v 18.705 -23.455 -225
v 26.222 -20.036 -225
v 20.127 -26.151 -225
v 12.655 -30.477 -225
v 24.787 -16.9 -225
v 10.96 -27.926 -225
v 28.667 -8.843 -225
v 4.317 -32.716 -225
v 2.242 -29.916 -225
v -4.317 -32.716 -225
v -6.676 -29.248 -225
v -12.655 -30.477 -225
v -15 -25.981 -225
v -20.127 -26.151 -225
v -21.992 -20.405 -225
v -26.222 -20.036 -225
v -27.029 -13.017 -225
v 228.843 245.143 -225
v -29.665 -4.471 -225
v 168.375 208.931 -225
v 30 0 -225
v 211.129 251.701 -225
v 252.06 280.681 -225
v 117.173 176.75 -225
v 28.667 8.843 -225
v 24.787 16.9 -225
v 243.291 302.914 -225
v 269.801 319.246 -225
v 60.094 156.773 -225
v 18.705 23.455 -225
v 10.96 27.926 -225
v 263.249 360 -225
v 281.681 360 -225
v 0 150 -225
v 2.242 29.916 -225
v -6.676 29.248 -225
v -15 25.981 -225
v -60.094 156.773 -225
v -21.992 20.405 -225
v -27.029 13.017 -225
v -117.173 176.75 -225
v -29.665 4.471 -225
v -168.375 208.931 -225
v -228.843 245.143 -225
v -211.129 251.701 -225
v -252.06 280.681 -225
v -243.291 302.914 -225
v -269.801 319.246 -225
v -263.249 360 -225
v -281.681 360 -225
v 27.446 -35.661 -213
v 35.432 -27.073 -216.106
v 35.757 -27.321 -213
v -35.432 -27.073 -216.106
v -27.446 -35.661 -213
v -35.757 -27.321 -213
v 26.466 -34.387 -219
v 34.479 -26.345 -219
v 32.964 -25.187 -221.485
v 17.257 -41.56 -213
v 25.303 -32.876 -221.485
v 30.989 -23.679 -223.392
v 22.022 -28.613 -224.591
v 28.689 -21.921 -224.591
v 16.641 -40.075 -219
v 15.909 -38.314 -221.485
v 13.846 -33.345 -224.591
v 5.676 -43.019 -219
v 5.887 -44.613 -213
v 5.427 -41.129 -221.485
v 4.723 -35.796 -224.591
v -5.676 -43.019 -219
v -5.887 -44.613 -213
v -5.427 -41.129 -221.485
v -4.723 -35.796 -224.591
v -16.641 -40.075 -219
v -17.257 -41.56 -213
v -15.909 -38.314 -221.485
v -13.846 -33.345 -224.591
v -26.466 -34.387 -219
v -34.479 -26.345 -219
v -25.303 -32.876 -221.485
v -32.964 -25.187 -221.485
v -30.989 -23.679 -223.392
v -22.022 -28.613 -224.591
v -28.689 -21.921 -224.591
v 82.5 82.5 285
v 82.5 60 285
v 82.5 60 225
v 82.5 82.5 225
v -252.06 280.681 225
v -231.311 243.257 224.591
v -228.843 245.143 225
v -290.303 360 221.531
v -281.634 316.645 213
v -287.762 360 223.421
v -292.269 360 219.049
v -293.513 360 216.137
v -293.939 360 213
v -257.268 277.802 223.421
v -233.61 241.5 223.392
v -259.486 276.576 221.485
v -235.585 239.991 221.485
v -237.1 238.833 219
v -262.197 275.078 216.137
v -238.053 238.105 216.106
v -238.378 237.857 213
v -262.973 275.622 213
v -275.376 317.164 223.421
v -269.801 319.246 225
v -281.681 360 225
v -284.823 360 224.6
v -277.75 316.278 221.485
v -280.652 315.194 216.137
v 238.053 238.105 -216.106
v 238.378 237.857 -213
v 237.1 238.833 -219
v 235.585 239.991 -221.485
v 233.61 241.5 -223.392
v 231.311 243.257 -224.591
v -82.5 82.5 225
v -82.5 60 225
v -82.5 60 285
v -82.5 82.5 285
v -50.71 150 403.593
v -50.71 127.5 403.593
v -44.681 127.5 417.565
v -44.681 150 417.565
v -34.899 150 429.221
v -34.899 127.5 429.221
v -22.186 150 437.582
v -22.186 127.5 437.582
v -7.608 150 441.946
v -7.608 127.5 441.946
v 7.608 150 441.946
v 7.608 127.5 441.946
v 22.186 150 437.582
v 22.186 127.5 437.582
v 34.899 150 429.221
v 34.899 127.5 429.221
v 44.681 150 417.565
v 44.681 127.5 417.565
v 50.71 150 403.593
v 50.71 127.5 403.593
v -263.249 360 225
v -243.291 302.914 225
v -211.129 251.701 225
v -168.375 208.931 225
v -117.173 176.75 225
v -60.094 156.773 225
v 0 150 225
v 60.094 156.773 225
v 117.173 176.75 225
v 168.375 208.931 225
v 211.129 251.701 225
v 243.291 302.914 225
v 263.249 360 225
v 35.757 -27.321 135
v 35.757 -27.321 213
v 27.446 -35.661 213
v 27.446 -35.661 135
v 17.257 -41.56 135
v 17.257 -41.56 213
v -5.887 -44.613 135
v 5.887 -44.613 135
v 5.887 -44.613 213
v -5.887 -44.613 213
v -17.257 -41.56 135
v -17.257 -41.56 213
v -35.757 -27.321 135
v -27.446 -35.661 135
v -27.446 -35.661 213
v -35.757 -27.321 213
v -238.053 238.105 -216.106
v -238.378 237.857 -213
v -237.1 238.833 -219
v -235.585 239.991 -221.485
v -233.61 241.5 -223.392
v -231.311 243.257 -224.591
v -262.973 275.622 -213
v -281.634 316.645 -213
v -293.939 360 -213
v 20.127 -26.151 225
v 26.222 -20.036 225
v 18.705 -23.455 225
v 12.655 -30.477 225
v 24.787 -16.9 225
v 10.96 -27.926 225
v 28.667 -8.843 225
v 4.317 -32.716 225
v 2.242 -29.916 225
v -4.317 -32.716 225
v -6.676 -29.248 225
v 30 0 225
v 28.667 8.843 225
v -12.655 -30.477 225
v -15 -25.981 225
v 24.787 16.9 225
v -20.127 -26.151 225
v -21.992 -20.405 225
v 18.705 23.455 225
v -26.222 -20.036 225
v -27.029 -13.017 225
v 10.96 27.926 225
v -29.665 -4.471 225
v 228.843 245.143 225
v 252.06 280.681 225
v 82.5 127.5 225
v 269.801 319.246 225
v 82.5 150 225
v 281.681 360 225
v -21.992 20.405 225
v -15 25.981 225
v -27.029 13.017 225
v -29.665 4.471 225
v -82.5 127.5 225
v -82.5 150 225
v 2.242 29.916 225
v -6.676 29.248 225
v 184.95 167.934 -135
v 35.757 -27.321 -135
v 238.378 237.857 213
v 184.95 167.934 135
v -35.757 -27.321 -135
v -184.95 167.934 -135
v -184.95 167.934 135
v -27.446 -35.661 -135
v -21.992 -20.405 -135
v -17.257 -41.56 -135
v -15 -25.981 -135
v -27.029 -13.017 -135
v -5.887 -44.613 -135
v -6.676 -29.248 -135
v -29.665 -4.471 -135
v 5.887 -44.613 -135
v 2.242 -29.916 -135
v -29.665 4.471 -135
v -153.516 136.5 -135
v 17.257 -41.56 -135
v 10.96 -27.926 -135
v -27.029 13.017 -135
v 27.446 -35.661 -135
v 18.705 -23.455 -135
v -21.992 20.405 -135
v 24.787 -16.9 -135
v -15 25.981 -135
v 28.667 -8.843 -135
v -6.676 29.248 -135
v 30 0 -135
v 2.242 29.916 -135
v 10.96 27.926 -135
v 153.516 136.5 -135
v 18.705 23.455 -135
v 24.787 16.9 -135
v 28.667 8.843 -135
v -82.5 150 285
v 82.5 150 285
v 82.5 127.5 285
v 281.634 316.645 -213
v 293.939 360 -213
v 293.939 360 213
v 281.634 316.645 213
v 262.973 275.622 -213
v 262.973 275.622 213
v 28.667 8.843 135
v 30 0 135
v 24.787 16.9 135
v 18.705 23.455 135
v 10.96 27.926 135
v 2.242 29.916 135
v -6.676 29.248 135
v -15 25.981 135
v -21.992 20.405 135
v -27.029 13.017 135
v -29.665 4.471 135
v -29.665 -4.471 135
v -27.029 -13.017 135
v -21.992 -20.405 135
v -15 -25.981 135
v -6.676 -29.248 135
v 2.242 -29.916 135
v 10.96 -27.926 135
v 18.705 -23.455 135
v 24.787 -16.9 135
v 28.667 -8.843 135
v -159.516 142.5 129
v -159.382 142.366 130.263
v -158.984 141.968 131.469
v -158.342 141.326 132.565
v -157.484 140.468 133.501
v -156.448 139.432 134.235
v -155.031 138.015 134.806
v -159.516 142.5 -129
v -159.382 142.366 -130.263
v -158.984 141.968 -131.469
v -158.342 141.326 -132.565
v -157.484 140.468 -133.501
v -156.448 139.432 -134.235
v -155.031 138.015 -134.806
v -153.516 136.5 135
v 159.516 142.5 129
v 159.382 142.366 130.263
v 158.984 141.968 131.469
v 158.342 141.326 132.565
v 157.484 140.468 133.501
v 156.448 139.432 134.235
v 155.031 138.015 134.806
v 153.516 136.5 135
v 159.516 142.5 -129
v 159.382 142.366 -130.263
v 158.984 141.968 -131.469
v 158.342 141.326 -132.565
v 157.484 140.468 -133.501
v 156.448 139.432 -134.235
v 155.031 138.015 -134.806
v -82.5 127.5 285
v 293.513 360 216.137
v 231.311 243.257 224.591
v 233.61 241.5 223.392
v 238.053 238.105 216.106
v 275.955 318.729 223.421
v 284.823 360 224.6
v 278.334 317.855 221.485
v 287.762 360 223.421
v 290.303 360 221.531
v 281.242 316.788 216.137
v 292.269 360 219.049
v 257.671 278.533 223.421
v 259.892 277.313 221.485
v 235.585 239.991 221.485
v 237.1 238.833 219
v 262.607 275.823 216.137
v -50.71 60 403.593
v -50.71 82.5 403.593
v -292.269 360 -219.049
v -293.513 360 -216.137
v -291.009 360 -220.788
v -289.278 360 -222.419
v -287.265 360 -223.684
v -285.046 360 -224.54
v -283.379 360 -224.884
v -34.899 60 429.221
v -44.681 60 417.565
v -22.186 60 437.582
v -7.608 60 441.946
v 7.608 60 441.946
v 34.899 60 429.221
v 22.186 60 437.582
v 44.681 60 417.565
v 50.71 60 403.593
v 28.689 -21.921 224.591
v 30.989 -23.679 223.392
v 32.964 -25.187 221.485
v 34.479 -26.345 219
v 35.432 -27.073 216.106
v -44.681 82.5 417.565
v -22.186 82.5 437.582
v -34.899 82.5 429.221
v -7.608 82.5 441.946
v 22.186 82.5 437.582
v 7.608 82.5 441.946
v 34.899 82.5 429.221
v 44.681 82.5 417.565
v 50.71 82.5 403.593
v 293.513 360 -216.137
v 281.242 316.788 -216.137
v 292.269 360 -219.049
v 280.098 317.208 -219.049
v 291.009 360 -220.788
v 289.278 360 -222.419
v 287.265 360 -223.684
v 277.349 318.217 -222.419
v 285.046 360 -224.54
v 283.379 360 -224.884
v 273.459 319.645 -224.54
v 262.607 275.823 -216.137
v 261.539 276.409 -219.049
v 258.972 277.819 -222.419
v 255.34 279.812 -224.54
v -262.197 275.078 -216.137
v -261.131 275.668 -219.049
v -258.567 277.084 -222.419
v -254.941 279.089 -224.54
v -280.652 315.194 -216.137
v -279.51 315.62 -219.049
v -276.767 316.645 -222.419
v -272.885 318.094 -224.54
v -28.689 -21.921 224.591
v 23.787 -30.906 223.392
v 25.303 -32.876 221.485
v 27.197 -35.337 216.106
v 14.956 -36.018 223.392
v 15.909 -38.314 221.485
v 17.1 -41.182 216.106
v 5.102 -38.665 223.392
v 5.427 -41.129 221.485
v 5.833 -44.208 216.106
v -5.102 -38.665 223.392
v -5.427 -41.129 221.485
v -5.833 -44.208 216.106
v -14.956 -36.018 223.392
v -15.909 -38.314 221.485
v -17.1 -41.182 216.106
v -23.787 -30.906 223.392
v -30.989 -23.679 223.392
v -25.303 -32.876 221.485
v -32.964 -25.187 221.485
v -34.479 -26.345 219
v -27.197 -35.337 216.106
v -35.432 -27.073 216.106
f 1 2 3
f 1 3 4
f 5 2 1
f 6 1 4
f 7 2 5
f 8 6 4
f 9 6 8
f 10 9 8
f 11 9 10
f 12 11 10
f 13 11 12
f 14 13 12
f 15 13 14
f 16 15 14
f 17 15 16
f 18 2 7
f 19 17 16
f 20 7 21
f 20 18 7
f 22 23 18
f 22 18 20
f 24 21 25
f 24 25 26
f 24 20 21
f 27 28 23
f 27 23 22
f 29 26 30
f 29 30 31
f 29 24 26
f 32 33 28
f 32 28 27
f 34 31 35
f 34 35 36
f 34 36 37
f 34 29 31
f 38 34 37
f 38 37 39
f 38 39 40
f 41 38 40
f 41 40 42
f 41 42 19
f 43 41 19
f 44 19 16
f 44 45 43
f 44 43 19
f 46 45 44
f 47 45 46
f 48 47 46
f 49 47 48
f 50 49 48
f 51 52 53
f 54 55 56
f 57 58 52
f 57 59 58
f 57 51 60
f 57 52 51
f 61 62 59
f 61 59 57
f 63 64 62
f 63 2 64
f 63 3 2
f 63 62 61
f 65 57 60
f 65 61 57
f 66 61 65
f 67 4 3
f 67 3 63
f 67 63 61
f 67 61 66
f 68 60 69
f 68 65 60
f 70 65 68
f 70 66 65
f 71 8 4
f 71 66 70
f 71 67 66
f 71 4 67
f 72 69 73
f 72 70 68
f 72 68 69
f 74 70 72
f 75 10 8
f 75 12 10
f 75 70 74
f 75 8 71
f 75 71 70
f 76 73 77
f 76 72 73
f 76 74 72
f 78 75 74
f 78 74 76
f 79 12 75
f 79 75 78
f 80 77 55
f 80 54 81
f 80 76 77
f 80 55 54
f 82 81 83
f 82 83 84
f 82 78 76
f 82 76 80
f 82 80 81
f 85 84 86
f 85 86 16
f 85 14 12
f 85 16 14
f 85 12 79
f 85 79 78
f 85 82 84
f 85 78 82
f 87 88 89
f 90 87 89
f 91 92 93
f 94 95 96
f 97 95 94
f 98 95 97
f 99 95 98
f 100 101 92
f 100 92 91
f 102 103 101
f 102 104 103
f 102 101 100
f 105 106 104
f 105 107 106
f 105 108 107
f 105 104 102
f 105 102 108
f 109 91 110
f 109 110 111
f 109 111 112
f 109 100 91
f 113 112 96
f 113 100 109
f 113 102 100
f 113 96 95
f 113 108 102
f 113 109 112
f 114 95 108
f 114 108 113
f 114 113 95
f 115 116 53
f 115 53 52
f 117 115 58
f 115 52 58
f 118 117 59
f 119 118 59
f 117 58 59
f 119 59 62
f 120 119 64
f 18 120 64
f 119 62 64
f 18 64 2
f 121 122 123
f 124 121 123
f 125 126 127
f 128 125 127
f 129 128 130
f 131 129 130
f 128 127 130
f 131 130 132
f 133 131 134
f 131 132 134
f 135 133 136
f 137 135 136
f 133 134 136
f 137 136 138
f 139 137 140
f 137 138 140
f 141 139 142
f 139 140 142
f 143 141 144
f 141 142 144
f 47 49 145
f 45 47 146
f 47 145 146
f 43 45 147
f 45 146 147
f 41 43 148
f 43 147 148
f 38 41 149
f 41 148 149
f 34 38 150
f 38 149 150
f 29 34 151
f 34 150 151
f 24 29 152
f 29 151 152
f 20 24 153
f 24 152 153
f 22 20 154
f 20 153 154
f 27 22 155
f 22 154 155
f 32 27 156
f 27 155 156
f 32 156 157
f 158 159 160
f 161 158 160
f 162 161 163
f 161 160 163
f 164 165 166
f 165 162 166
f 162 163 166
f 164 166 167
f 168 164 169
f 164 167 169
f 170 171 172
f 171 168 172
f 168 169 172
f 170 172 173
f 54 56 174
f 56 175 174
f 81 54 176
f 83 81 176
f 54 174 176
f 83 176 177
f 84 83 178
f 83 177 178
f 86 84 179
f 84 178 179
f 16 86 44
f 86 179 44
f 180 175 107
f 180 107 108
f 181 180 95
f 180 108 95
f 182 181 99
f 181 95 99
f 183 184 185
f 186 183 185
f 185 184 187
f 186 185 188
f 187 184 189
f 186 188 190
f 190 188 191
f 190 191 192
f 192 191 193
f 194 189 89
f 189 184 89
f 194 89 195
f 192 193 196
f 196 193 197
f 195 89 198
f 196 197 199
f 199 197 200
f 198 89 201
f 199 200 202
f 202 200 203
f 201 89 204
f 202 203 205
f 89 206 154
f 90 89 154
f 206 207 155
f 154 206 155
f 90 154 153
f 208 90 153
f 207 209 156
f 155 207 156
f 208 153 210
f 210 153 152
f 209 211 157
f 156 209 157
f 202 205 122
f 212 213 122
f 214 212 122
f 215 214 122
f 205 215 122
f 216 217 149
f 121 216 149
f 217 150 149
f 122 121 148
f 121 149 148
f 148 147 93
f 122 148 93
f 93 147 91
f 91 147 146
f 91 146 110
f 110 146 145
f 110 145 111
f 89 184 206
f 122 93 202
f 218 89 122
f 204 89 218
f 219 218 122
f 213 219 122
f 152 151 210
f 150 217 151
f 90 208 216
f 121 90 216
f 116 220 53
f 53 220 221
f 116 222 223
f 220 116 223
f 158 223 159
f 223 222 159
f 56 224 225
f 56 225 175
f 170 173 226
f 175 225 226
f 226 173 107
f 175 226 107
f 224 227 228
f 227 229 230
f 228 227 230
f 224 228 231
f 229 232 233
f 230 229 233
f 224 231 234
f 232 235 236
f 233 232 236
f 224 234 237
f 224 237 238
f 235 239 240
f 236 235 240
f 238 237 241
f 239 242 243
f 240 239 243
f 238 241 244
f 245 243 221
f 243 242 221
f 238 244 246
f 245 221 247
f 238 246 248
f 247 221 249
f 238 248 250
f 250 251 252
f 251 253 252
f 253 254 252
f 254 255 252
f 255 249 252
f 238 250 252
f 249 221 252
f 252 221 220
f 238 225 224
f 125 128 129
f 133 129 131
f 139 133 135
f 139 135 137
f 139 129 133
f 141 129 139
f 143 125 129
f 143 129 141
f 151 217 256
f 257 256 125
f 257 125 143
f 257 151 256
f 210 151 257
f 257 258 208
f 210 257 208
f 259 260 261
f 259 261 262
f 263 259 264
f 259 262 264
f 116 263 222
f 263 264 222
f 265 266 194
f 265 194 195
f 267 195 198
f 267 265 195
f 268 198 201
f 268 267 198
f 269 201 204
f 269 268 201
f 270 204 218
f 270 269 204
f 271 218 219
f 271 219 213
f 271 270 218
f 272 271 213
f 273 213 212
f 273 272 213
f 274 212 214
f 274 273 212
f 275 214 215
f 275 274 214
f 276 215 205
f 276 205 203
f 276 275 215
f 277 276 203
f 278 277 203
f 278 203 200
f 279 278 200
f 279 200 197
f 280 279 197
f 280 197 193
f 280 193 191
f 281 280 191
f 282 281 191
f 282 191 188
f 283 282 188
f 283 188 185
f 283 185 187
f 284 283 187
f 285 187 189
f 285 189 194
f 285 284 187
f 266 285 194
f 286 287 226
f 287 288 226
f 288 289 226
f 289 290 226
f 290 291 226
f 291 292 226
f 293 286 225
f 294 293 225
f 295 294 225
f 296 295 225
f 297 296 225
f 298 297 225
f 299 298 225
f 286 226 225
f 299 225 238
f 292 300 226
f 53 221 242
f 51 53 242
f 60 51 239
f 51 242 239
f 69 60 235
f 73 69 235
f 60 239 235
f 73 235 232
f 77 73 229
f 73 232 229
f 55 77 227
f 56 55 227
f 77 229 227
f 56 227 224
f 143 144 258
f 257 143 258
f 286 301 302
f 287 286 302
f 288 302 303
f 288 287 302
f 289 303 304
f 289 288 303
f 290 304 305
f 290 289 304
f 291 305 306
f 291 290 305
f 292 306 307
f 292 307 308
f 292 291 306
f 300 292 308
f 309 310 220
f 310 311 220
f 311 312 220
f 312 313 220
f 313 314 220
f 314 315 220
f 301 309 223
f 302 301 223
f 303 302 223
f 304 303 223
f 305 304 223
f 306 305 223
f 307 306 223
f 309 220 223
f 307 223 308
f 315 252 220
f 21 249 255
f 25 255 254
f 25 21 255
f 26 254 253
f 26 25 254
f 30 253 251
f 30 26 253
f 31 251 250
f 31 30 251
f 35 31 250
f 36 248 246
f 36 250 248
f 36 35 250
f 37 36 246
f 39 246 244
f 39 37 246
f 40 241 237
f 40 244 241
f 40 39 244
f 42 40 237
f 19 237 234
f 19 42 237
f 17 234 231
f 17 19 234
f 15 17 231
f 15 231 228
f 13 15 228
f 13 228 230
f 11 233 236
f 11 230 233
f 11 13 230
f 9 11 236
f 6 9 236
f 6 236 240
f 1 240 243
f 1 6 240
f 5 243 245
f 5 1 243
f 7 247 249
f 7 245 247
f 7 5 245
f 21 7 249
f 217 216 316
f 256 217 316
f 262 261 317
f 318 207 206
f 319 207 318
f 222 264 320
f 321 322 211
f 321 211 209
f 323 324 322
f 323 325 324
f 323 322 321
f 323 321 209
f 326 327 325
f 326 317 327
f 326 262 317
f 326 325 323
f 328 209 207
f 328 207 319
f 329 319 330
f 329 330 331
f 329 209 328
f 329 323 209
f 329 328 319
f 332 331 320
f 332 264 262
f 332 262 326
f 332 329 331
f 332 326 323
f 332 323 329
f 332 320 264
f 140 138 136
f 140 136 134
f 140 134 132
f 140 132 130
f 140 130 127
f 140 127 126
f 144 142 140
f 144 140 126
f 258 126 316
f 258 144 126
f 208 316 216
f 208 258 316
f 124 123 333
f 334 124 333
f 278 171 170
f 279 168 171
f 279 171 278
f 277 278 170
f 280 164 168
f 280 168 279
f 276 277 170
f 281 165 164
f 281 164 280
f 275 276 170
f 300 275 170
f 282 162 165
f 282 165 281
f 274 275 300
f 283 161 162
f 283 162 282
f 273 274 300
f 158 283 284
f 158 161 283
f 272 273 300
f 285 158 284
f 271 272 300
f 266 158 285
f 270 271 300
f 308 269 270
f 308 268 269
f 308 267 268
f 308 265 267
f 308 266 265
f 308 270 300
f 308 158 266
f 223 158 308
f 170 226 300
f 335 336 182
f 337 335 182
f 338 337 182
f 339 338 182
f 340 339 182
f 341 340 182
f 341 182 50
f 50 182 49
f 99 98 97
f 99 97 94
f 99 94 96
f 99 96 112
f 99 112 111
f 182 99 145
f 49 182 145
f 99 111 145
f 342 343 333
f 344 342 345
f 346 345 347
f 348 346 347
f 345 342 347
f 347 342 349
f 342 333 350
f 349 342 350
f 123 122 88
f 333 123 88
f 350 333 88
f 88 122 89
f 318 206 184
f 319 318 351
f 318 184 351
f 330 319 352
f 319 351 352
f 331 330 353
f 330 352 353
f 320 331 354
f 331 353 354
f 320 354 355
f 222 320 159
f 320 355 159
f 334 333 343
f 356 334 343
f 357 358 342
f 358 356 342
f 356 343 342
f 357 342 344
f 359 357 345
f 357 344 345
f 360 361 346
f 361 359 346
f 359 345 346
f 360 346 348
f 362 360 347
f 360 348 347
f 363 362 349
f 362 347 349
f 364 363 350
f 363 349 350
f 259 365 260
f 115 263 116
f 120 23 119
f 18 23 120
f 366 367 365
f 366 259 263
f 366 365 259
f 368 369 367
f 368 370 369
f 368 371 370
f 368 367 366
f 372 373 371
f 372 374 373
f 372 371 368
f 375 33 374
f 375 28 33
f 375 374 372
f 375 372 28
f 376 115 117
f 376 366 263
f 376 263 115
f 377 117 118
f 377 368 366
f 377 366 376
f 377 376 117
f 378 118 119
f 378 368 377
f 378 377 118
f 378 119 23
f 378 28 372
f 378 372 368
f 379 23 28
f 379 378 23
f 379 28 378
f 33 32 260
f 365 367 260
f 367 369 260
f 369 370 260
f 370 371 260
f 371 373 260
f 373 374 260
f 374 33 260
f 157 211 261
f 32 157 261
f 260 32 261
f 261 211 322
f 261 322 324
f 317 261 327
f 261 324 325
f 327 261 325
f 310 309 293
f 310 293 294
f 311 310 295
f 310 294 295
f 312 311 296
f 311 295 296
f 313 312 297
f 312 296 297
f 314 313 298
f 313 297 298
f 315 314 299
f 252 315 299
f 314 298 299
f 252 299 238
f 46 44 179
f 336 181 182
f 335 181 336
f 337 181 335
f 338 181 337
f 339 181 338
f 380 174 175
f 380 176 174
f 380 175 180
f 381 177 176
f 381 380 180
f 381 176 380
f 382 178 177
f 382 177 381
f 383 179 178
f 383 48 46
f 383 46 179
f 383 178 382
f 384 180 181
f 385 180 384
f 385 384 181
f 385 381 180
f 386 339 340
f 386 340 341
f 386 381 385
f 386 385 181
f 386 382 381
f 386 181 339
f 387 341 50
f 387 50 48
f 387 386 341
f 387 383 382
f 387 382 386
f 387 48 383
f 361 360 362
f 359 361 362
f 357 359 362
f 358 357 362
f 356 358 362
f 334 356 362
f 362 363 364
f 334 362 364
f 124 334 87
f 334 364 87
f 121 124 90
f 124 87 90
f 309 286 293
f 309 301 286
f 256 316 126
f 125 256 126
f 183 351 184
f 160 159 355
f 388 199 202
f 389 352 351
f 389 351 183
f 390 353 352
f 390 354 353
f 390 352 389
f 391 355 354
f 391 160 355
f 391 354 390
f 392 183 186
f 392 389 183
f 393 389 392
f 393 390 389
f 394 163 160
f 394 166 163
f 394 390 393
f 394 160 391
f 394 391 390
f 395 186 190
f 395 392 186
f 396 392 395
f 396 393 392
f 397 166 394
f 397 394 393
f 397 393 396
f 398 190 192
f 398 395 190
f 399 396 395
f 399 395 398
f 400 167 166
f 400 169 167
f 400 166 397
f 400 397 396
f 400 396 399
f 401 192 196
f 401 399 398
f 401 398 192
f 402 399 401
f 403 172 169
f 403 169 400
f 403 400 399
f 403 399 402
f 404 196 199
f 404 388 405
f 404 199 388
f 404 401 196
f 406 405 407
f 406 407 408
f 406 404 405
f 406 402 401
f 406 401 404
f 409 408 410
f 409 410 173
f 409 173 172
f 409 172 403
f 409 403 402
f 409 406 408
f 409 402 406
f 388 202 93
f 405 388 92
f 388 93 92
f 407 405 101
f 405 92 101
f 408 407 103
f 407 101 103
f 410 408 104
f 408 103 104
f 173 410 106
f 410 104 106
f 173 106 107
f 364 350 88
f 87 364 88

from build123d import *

# Parameters (mm, degrees)
SKETCH1_R             = 30
BOSS_EXTRUDE2_DEPTH   = 225
BOSS_EXTRUDE3_START   = 60
BOSS_EXTRUDE3_DEPTH   = 90
SKETCH3_W             = 257.405164054
SKETCH3_H             = 45
CUT_EXTRUDE1_DEPTH    = 151.9
SKETCH4_W             = 270
SKETCH4_H             = 367.4
CUT_EXTRUDE2_DEPTH    = 421.85
CHAMFER1_SIZE         = 6
CHAMFER1_SIZE2        = 32.008563289
CHAMFER1_EDGE_2_SIZE  = 6
CHAMFER1_EDGE_2_SIZE2 = 32.008563289
FILLET1_R             = 6
FILLET2_R             = 12


with BuildPart() as part:
    # Sketch1 → Boss-Extrude2 (new, symmetric)
    with BuildSketch(Plane.XY):
        with BuildLine():
            Line((238.377808514, 237.857142857), (35.756671277, -27.321428571))
            ThreePointArc((35.756671277, -27.321428571), (0, -45), (-35.756671277, -27.321428571))
            Line((-35.756671277, -27.321428571), (-238.377808514, 237.857142857))
            ThreePointArc((-238.377808514, 237.857142857), (-273.074997203, 295.782264138), (-293.938769134, 360))
            Line((-293.938769134, 360), (-263.248931622, 360))
            ThreePointArc((-263.248931622, 360), (0, 150), (263.248931622, 360))
            Line((263.248931622, 360), (293.938769134, 360))
            ThreePointArc((293.938769134, 360), (273.074997203, 295.782264138), (238.377808514, 237.857142857))
        make_face()
        Circle(SKETCH1_R, mode=Mode.SUBTRACT)
    extrude(amount=BOSS_EXTRUDE2_DEPTH, both=True)

    # Sketch2 → Boss-Extrude3 (add)
    with BuildSketch(Plane(origin=(0, 0, 0), x_dir=(1, 0, 0), z_dir=(0, 1, 0)).offset(BOSS_EXTRUDE3_START)):
        with BuildLine():
            Line((82.5, -225), (-82.5, -225))
            Line((-82.5, -225), (-82.5, -285))
            Line((-82.5, -285), (-50.709680046, -403.593320036))
            ThreePointArc((-50.709680046, -403.593320036), (0, -442.5), (50.709680046, -403.593320036))
            Line((50.709680046, -403.593320036), (82.5, -285))
            Line((82.5, -285), (82.5, -225))
        make_face()
    extrude(amount=BOSS_EXTRUDE3_DEPTH)

    # Sketch3 → Cut-Extrude1 (cut, symmetric)
    with BuildSketch(Plane(origin=(0, 0, 0), x_dir=(0, 0, -1), z_dir=(1, 0, 0))):
        with Locations((-353.702582027, 105)):
            Rectangle(SKETCH3_W, SKETCH3_H)
    extrude(amount=CUT_EXTRUDE1_DEPTH, both=True, mode=Mode.SUBTRACT)

    # Sketch4 → Cut-Extrude2 (cut, symmetric)
    with BuildSketch(Plane(origin=(0, 0, 0), x_dir=(0, 0, -1), z_dir=(1, 0, 0))):
        with Locations((0, -41.2)):
            Rectangle(SKETCH4_W, SKETCH4_H)
    extrude(amount=CUT_EXTRUDE2_DEPTH, both=True, mode=Mode.SUBTRACT)

    # Chamfer1
    chamfer1_edges = [part.edges().sort_by_distance(p)[0] for p in [
        (165.516066235, 142.5, 0),
    ]]
    chamfer1_side = [part.faces().sort_by_distance(p)[0] for p in [
        (0, 142.5, 0),
    ]]
    chamfer(chamfer1_edges, length=CHAMFER1_SIZE, length2=CHAMFER1_SIZE2, reference=chamfer1_side[0])

    # Chamfer1 edge 2
    chamfer1_edge_2_edges = [part.edges().sort_by_distance(p)[0] for p in [
        (-165.516066235, 142.5, 0),
    ]]
    chamfer1_edge_2_side = [part.faces().sort_by_distance(p)[0] for p in [
        (0, 142.5, 0),
    ]]
    chamfer(chamfer1_edge_2_edges, length=CHAMFER1_EDGE_2_SIZE, length2=CHAMFER1_EDGE_2_SIZE2, reference=chamfer1_edge_2_side[0])

    # Fillet1
    fillet1_edges = [part.edges().sort_by_distance(p)[0] for p in [
        (0, 142.5, -135),
        (0, 142.5, 135),
    ]]
    fillet(fillet1_edges, radius=FILLET1_R)

    # Fillet2
    fillet2_edges = [part.edges().sort_by_distance(p)[0] for p in [
        (273.074997203, 295.782264138, -225),
        (-273.074997203, 295.782264138, 225),
        (-137.067239895, 105.267857143, 225),
        (0, -45, 225),
        (137.067239895, 105.267857143, 225),
        (273.074997203, 295.782264138, 225),
        (137.067239895, 105.267857143, -225),
        (0, -45, -225),
        (-137.067239895, 105.267857143, -225),
        (-273.074997203, 295.782264138, -225),
    ]]
    fillet(fillet2_edges, radius=FILLET2_R)


solid = part.part
